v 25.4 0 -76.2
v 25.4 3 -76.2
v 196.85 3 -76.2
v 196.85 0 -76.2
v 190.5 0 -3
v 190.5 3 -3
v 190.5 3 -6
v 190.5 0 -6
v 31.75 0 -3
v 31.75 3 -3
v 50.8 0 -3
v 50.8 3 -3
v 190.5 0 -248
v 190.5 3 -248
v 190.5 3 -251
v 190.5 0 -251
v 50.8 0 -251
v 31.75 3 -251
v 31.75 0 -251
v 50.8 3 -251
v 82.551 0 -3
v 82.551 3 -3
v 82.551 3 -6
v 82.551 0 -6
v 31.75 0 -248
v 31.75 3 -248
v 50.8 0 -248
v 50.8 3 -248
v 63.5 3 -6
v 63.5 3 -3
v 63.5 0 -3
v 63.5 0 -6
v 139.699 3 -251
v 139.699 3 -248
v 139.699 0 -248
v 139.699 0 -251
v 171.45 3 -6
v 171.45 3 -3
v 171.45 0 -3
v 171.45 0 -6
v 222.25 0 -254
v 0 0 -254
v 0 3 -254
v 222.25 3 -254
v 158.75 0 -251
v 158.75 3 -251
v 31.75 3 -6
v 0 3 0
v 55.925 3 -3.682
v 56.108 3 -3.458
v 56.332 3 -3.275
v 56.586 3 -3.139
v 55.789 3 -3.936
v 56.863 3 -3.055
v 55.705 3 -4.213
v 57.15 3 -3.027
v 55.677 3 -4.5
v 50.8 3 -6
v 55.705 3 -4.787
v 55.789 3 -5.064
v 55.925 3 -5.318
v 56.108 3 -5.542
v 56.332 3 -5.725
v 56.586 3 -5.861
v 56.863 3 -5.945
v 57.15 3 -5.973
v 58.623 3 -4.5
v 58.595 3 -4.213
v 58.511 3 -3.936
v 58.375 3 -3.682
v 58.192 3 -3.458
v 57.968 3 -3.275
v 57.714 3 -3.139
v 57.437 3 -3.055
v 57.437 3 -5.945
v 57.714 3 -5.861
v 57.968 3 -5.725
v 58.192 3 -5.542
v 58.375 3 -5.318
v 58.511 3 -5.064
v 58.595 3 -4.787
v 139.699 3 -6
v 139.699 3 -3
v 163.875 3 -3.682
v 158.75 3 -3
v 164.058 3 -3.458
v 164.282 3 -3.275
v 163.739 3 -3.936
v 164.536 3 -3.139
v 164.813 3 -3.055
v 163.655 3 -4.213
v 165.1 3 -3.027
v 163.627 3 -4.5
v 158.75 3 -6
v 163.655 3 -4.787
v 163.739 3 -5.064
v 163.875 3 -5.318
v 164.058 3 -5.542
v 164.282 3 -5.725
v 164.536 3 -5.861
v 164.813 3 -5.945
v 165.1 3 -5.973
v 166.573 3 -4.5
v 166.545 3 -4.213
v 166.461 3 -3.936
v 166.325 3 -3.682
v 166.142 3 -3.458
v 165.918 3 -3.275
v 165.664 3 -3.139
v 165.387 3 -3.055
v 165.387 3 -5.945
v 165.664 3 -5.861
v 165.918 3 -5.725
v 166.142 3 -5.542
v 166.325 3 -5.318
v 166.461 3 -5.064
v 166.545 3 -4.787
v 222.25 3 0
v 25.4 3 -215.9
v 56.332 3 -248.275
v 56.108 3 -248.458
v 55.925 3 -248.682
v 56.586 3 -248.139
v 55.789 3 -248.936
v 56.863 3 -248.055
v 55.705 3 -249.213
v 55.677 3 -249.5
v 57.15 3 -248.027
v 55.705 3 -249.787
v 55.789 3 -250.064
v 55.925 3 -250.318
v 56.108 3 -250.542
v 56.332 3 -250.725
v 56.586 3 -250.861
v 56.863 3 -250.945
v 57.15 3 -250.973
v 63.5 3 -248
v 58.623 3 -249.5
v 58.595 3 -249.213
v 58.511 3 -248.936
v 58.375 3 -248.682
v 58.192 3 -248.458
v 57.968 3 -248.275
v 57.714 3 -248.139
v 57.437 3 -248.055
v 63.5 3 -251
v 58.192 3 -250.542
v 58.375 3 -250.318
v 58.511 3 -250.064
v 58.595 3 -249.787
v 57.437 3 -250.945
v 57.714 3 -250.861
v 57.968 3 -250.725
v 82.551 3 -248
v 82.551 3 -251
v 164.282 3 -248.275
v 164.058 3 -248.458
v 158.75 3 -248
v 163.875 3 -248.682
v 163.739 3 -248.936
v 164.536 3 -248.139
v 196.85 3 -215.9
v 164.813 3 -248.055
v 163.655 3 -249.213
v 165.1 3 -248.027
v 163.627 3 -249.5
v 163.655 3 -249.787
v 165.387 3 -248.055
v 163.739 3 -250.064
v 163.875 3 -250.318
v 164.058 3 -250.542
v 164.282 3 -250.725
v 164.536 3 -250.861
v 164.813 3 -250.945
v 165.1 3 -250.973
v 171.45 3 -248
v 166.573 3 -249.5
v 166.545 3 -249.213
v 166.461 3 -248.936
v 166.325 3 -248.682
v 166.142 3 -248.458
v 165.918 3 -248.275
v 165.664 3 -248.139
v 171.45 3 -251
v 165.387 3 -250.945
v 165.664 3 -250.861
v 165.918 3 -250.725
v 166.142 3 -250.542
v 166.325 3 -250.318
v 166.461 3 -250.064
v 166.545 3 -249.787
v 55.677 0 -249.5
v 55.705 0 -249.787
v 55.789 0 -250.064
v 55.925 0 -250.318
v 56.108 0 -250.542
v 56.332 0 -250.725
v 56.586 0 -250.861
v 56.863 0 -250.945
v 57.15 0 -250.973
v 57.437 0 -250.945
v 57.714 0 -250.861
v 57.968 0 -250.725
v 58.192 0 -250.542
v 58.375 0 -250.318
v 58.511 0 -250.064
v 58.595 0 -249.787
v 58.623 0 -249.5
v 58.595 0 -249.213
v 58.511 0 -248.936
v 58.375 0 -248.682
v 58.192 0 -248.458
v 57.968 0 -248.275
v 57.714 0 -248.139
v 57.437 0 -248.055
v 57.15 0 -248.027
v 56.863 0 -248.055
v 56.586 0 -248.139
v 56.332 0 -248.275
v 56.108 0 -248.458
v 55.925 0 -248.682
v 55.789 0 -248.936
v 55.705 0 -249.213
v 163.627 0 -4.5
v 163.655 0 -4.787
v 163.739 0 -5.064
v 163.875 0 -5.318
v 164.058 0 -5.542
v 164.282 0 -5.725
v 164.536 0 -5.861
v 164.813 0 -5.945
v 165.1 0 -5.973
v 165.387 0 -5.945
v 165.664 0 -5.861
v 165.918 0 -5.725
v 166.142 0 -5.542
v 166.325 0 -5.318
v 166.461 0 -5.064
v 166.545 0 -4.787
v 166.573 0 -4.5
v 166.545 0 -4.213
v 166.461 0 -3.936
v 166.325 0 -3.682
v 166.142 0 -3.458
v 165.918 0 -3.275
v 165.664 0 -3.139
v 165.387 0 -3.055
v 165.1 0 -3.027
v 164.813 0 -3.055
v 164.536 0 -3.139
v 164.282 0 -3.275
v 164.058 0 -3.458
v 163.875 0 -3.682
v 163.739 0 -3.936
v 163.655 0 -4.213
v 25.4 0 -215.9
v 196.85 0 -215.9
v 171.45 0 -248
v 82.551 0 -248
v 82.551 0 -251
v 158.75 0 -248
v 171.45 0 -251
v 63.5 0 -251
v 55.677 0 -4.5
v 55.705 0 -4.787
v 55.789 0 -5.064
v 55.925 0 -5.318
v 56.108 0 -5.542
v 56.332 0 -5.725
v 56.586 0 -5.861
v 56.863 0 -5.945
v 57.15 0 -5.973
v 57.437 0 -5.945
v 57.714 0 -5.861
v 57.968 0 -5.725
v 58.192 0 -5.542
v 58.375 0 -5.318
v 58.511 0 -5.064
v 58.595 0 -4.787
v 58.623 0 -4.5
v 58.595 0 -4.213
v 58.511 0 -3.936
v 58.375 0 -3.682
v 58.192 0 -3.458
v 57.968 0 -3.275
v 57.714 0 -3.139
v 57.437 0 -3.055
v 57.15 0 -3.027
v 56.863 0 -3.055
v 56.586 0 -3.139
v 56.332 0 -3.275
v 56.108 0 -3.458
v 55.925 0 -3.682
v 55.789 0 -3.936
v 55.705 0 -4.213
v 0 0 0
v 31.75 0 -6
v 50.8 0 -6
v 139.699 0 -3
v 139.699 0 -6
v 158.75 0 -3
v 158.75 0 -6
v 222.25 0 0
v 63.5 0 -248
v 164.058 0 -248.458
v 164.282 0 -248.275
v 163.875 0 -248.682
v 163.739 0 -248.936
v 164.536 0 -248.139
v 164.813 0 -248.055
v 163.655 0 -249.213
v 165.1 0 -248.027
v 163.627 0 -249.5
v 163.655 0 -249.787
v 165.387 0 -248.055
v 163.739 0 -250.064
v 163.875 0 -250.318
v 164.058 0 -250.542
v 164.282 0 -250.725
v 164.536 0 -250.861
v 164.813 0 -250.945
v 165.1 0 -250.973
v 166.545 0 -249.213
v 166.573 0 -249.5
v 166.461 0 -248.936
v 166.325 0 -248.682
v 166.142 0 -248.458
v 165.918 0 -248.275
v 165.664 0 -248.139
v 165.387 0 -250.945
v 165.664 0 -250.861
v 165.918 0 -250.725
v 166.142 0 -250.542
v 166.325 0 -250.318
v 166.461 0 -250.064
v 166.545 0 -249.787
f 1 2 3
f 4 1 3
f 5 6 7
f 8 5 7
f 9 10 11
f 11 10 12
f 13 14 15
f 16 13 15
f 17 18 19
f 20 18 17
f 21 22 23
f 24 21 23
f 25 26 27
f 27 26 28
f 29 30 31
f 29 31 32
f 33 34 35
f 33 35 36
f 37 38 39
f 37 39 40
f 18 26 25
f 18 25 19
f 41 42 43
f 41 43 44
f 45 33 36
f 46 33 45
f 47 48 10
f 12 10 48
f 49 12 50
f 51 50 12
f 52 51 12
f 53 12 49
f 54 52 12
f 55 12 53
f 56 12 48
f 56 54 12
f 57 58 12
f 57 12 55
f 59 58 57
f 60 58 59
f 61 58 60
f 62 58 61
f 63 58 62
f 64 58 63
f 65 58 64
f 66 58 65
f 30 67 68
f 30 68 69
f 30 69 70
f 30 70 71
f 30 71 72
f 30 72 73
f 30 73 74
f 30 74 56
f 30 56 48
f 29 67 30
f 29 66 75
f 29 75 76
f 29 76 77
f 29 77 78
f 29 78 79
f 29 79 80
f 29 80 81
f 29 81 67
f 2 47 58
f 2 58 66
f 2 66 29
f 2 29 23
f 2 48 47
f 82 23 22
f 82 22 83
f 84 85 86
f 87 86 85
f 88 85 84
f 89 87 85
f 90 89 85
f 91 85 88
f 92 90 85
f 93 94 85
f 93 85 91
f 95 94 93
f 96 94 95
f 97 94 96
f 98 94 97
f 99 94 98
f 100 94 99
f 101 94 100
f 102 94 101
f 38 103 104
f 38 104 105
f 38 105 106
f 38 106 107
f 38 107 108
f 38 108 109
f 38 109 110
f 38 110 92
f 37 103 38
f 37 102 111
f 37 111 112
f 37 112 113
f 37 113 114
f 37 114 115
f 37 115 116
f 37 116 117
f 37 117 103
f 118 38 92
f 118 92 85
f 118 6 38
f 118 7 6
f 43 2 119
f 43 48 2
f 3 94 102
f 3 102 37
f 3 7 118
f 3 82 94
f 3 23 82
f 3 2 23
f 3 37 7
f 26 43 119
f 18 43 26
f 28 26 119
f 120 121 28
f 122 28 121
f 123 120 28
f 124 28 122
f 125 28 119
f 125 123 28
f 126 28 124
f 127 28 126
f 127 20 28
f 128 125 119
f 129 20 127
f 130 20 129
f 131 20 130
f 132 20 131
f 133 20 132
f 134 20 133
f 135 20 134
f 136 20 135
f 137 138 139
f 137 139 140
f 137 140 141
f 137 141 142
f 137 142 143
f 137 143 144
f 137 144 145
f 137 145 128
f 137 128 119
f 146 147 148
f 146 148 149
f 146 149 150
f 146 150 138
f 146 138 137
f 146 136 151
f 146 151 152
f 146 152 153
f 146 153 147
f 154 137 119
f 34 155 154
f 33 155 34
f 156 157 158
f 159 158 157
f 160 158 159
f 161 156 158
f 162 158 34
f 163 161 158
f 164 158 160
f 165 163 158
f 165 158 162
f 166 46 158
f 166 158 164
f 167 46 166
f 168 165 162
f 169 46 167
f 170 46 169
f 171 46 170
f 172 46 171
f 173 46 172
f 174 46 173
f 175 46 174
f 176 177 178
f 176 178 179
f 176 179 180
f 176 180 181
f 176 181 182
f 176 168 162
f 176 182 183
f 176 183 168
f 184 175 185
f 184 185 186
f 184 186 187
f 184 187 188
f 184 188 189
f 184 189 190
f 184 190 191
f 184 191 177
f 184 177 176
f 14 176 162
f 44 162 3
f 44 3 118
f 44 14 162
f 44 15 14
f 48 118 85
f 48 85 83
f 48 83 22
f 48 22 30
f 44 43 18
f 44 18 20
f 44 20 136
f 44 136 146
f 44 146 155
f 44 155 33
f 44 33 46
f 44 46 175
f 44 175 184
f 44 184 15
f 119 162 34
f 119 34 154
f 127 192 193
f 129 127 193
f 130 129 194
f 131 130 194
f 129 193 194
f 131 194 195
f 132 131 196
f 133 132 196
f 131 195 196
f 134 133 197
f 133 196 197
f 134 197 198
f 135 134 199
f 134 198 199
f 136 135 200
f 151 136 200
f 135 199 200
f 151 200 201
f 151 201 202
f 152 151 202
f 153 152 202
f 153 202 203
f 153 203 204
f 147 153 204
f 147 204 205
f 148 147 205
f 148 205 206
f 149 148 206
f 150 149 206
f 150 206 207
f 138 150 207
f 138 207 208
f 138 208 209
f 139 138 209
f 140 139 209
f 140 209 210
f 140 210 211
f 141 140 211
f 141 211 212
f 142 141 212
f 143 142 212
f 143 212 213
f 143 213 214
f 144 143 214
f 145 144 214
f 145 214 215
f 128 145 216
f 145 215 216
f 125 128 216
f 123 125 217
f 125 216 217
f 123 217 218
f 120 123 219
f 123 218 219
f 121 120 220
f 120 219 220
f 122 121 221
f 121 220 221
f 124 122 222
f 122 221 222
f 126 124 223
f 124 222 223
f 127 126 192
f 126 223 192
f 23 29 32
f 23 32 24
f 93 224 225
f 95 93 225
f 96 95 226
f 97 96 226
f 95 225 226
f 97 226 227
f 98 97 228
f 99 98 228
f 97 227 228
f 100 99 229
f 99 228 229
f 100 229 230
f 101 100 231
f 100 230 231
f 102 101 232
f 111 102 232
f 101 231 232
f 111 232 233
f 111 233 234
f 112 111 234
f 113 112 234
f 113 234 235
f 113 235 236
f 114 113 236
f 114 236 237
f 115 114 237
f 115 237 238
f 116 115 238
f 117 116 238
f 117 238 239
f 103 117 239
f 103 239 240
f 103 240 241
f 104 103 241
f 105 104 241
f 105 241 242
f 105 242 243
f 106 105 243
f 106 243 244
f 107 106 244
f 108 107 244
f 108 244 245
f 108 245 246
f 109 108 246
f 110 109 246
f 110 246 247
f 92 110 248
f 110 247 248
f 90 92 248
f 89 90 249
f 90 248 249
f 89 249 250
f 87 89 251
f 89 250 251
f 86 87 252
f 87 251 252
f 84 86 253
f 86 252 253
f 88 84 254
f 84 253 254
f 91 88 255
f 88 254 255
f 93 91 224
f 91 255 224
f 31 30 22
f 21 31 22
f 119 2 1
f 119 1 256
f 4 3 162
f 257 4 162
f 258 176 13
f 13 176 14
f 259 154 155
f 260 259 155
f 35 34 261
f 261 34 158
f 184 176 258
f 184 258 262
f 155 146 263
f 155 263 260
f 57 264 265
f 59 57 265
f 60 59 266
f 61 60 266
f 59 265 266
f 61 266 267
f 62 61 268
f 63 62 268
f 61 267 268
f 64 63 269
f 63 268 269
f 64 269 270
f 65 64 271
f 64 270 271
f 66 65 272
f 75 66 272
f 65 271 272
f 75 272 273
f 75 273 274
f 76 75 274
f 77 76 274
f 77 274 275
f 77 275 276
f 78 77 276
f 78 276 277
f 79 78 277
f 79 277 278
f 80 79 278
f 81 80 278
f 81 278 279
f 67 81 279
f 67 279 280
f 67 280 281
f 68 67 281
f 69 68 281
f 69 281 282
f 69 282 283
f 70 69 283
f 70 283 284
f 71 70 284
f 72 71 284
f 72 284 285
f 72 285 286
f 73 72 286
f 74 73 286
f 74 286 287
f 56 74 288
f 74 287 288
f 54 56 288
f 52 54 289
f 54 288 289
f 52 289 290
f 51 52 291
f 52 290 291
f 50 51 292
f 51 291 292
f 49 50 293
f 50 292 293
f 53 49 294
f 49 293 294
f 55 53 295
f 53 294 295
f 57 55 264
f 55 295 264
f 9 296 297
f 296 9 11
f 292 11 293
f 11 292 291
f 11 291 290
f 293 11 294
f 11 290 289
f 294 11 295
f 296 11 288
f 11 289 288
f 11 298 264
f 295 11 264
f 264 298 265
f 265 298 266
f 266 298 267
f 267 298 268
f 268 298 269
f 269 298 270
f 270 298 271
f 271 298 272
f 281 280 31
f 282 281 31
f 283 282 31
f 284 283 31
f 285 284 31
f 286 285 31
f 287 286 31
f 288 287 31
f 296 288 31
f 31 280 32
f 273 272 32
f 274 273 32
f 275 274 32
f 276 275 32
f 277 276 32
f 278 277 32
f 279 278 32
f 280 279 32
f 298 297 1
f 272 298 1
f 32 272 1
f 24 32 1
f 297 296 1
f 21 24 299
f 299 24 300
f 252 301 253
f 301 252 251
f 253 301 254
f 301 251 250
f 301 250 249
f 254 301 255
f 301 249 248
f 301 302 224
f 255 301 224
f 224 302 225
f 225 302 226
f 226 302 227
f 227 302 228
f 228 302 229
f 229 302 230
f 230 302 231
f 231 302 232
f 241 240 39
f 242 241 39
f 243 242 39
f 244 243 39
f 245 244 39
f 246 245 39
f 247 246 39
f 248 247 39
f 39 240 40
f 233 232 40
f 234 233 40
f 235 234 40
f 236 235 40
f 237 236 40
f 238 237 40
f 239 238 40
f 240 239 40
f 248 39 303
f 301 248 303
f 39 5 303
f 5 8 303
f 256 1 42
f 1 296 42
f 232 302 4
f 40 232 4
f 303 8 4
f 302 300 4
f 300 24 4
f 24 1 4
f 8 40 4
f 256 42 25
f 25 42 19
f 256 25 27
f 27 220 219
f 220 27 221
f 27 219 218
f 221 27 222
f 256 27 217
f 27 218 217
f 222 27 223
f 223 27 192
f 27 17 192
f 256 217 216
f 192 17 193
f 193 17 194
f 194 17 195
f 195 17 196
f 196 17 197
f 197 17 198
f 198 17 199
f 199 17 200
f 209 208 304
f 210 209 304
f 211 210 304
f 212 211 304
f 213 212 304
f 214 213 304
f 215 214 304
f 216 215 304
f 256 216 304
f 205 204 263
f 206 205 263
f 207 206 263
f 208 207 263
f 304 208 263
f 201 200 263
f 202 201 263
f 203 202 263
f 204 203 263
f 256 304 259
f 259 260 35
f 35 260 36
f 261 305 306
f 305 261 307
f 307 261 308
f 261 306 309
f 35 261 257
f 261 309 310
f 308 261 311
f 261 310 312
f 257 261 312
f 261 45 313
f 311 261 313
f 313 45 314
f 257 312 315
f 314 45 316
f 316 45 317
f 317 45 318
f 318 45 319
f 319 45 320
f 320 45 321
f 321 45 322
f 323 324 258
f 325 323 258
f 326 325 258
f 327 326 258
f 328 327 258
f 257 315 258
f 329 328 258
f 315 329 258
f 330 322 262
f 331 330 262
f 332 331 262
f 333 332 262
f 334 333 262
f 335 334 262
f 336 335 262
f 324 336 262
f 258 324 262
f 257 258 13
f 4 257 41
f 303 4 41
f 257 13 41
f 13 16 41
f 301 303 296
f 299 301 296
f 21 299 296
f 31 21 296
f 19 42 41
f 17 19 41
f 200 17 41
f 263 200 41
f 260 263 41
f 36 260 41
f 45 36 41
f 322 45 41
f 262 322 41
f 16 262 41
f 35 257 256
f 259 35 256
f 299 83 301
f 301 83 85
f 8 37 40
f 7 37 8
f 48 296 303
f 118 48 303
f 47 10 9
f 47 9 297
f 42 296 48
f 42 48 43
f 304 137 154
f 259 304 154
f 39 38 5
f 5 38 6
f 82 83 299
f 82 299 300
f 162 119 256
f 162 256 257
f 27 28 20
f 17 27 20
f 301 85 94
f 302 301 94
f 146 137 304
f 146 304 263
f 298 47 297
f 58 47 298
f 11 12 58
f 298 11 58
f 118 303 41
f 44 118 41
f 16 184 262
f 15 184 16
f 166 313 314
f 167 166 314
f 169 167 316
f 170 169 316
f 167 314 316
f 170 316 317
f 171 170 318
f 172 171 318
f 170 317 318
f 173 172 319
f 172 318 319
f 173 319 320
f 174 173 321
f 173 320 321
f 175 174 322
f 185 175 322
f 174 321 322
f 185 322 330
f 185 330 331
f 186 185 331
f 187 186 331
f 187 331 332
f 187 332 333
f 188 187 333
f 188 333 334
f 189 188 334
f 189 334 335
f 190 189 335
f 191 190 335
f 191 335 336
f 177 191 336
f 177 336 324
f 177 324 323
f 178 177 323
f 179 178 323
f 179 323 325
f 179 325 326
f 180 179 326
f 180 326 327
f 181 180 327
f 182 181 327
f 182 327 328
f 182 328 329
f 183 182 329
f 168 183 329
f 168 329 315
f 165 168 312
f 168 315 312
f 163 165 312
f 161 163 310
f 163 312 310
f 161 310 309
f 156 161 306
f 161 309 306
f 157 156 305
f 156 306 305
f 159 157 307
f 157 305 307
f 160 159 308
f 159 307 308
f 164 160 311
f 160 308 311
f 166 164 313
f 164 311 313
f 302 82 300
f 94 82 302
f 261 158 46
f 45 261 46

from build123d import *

# Parameters (mm, degrees)
SKETCH2_W             = 222.25
SKETCH2_H             = 254
BOSS_EXTRUDE1_DEPTH   = 3
SKETCH5_W             = 19.05
SKETCH5_H             = 3
SKETCH5_W_2           = 19.051189761
CUT_EXTRUDE1_DEPTH    = 4
F_4_CLEARANCE_HOLE2_D = 2.9464
SKETCH8_W             = 171.45
SKETCH8_H             = 139.7
CUT_EXTRUDE2_DEPTH    = 4


with BuildPart() as part:
    # Sketch2 → Boss-Extrude1 (new body)
    with BuildSketch(Plane(origin=(0, 0, 0), x_dir=(1, 0, 0), z_dir=(0, 1, 0))):
        with Locations((111.125, 127)):
            Rectangle(SKETCH2_W, SKETCH2_H)
    extrude(amount=BOSS_EXTRUDE1_DEPTH)

    # Sketch5 → Cut-Extrude1 (cut, through all)
    with BuildSketch(Plane(origin=(0, 3, 0), x_dir=(1, 0, 0), z_dir=(0, 1, 0))):
        with Locations((41.275, 249.5)):
            Rectangle(SKETCH5_W, SKETCH5_H)
        with Locations((73.025594881, 249.5)):
            Rectangle(SKETCH5_W_2, SKETCH5_H)
        with Locations((149.22440512, 249.5)):
            Rectangle(SKETCH5_W_2, SKETCH5_H)
        with Locations((180.975, 249.5)):
            Rectangle(SKETCH5_W, SKETCH5_H)
        with Locations((41.275, 4.5)):
            Rectangle(SKETCH5_W, SKETCH5_H)
        with Locations((73.025594881, 4.5)):
            Rectangle(SKETCH5_W_2, SKETCH5_H)
        with Locations((180.975, 4.5)):
            Rectangle(SKETCH5_W, SKETCH5_H)
        with Locations((149.22440512, 4.5)):
            Rectangle(SKETCH5_W_2, SKETCH5_H)
    extrude(amount=-CUT_EXTRUDE1_DEPTH, mode=Mode.SUBTRACT)

    # #4 Clearance Hole2 (through all)
    with Locations(Plane(origin=(0, 3, 0), x_dir=(1, 0, 0), z_dir=(0, 1, 0))):
        with Locations((57.15, 249.5), (165.1, 249.5), (165.1, 4.5), (57.15, 4.5)):
            Hole(F_4_CLEARANCE_HOLE2_D / 2)

    # Sketch8 → Cut-Extrude2 (cut, through all)
    with BuildSketch(Plane(origin=(0, 3, 0), x_dir=(1, 0, 0), z_dir=(0, 1, 0))):
        with Locations((111.125, 146.05)):
            Rectangle(SKETCH8_W, SKETCH8_H)
    extrude(amount=-CUT_EXTRUDE2_DEPTH, mode=Mode.SUBTRACT)


solid = part.part
